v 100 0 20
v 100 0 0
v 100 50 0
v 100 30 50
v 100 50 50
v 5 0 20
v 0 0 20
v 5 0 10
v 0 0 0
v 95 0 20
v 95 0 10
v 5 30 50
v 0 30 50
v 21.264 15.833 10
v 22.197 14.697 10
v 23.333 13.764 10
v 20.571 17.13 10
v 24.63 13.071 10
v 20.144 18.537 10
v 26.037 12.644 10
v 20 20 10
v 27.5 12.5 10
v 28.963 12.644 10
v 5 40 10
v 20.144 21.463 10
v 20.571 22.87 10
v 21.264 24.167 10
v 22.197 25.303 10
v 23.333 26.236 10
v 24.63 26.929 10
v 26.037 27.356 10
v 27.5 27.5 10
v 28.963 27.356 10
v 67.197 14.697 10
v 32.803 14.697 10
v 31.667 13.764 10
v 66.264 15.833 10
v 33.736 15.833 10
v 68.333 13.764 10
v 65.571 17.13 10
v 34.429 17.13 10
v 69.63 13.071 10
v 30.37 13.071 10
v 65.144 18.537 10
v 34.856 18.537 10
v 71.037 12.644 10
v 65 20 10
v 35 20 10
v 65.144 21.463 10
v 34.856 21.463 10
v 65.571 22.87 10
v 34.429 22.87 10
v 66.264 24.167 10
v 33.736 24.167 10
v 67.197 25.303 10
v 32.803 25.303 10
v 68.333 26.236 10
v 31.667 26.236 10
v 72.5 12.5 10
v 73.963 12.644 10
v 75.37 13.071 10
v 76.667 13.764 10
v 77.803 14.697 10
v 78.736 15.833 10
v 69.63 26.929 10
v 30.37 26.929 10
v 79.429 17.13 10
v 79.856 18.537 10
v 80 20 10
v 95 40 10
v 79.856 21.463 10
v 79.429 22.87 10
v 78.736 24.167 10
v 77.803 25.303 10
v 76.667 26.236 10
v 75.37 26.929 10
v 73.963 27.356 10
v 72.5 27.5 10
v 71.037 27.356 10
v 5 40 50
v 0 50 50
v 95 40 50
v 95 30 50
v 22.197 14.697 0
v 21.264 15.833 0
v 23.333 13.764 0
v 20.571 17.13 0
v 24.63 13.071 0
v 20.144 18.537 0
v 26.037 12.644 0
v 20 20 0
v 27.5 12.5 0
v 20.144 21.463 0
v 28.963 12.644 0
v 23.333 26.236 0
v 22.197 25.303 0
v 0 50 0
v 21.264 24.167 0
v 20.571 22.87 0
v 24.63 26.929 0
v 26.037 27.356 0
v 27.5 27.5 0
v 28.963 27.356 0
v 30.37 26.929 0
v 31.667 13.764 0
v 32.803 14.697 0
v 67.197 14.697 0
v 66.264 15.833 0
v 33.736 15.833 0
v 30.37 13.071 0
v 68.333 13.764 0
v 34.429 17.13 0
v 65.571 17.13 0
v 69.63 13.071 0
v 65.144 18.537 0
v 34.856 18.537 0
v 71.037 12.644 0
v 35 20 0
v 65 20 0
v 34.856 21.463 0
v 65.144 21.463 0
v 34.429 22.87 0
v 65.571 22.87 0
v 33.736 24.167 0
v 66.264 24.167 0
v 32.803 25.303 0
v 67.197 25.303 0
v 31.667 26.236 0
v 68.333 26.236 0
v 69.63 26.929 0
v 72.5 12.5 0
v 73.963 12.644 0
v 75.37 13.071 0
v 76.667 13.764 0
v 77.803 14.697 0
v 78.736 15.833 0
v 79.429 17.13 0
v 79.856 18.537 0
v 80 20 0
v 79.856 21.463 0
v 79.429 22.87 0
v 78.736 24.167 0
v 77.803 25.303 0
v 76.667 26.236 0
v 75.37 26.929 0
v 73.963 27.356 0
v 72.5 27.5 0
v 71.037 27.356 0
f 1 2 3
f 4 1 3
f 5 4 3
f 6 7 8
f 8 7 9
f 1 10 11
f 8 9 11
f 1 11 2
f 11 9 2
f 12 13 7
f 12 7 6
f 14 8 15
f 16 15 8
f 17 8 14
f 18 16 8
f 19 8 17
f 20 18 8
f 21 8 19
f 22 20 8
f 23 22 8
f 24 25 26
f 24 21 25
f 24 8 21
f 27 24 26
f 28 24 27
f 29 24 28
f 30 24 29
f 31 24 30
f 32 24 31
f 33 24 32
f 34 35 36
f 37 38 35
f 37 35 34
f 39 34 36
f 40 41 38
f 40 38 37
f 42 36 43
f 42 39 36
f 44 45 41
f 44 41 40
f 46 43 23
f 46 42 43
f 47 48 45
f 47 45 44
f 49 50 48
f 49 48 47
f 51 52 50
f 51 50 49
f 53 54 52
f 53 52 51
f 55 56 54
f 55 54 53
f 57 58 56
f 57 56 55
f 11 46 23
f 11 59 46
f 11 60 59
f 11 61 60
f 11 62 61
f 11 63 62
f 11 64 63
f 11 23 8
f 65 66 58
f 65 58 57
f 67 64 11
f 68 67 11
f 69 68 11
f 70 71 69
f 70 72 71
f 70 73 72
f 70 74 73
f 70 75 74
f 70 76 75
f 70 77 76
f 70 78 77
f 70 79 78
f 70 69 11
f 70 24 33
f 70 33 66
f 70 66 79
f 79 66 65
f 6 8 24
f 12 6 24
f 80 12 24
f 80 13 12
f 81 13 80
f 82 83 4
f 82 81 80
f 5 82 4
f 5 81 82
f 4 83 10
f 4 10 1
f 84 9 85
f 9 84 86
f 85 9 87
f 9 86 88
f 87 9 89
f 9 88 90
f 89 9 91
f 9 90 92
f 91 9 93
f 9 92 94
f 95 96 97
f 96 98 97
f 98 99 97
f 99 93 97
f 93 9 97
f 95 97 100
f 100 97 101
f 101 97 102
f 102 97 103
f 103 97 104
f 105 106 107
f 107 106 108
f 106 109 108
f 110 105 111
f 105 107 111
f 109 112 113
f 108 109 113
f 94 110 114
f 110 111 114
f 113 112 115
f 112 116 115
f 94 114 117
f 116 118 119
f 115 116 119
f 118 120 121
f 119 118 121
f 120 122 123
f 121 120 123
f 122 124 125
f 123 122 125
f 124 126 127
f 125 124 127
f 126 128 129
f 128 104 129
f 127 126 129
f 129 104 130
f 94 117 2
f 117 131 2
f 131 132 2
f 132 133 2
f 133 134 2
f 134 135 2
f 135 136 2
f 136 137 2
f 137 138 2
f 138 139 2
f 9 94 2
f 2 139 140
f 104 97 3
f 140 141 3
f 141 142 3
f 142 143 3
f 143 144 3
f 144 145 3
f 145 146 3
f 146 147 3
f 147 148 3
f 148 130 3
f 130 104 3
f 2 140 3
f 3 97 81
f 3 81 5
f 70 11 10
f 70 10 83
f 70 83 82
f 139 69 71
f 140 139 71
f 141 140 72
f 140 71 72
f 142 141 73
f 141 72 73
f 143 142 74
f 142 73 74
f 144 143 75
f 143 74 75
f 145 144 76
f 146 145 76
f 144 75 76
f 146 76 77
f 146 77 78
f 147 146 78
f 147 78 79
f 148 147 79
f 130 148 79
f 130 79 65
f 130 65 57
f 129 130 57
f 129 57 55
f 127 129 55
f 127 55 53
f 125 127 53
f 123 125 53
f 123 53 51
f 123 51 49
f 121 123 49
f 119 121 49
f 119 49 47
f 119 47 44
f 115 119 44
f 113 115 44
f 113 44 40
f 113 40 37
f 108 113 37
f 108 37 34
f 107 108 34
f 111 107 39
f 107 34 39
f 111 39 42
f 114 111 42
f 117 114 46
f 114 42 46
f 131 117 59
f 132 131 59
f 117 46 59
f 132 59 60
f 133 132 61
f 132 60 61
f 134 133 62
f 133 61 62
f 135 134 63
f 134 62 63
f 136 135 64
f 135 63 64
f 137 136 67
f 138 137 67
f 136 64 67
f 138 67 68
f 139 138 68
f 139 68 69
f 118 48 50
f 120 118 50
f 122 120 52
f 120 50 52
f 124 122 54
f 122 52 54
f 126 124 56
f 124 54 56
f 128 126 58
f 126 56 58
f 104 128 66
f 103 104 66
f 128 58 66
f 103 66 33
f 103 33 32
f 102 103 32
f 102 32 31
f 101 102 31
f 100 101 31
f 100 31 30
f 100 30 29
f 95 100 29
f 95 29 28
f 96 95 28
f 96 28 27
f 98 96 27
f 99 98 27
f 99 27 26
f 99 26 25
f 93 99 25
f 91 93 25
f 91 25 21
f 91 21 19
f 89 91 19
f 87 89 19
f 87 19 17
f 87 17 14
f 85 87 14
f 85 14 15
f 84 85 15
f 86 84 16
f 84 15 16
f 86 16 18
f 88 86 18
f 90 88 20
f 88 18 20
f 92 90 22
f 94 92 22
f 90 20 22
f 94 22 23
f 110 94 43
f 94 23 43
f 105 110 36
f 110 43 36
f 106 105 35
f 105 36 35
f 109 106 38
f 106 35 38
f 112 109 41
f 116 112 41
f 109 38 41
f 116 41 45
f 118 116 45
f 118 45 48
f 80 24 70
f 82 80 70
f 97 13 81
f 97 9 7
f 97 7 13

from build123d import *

# Parameters (mm, degrees)
F0_W     = 100
F0_H     = 50
F1_DEPTH = 50
F2_T     = -10
F3_R     = 7.5
F4_DEPTH = 10.001
F5_W     = 5
F5_H     = 40
F6_DEPTH = 40
F7_SIZE  = 30


with BuildPart() as f1:
    # F0 (on Top) → F1 (new body)
    with BuildSketch(Plane.XY):
        with Locations((50, 25)):
            Rectangle(F0_W, F0_H)
    extrude(amount=F1_DEPTH)

    # F2
    f2_openings = [f1.faces().sort_by_distance(p)[0] for p in [
        (50, 25, 50),
        (50, 0, 25),
        (100, 25, 25),
        (0, 25, 25),
    ]]
    offset(amount=F2_T, openings=f2_openings)

    # F3 (on face) → F4 (cut, through all)
    with BuildSketch(Plane.XY.offset(10)):
        with Locations((27.5, 20)):
            Circle(F3_R)
        with Locations((72.5, 20)):
            Circle(F3_R)
    extrude(amount=-F4_DEPTH, mode=Mode.SUBTRACT)

    # F5 (on face) → F6 (join)
    with BuildSketch(Plane.XY.offset(10)):
        with Locations((2.5, 20)):
            Rectangle(F5_W, F5_H)
        with Locations((97.5, 20)):
            Rectangle(F5_W, F5_H)
    extrude(amount=F6_DEPTH)

    # F7
    f7_edges = [f1.edges().sort_by_distance(p)[0] for p in [
        (2.5, 0, 50),
        (97.5, 0, 50),
    ]]
    chamfer(f7_edges, length=F7_SIZE)


solid = f1.part
